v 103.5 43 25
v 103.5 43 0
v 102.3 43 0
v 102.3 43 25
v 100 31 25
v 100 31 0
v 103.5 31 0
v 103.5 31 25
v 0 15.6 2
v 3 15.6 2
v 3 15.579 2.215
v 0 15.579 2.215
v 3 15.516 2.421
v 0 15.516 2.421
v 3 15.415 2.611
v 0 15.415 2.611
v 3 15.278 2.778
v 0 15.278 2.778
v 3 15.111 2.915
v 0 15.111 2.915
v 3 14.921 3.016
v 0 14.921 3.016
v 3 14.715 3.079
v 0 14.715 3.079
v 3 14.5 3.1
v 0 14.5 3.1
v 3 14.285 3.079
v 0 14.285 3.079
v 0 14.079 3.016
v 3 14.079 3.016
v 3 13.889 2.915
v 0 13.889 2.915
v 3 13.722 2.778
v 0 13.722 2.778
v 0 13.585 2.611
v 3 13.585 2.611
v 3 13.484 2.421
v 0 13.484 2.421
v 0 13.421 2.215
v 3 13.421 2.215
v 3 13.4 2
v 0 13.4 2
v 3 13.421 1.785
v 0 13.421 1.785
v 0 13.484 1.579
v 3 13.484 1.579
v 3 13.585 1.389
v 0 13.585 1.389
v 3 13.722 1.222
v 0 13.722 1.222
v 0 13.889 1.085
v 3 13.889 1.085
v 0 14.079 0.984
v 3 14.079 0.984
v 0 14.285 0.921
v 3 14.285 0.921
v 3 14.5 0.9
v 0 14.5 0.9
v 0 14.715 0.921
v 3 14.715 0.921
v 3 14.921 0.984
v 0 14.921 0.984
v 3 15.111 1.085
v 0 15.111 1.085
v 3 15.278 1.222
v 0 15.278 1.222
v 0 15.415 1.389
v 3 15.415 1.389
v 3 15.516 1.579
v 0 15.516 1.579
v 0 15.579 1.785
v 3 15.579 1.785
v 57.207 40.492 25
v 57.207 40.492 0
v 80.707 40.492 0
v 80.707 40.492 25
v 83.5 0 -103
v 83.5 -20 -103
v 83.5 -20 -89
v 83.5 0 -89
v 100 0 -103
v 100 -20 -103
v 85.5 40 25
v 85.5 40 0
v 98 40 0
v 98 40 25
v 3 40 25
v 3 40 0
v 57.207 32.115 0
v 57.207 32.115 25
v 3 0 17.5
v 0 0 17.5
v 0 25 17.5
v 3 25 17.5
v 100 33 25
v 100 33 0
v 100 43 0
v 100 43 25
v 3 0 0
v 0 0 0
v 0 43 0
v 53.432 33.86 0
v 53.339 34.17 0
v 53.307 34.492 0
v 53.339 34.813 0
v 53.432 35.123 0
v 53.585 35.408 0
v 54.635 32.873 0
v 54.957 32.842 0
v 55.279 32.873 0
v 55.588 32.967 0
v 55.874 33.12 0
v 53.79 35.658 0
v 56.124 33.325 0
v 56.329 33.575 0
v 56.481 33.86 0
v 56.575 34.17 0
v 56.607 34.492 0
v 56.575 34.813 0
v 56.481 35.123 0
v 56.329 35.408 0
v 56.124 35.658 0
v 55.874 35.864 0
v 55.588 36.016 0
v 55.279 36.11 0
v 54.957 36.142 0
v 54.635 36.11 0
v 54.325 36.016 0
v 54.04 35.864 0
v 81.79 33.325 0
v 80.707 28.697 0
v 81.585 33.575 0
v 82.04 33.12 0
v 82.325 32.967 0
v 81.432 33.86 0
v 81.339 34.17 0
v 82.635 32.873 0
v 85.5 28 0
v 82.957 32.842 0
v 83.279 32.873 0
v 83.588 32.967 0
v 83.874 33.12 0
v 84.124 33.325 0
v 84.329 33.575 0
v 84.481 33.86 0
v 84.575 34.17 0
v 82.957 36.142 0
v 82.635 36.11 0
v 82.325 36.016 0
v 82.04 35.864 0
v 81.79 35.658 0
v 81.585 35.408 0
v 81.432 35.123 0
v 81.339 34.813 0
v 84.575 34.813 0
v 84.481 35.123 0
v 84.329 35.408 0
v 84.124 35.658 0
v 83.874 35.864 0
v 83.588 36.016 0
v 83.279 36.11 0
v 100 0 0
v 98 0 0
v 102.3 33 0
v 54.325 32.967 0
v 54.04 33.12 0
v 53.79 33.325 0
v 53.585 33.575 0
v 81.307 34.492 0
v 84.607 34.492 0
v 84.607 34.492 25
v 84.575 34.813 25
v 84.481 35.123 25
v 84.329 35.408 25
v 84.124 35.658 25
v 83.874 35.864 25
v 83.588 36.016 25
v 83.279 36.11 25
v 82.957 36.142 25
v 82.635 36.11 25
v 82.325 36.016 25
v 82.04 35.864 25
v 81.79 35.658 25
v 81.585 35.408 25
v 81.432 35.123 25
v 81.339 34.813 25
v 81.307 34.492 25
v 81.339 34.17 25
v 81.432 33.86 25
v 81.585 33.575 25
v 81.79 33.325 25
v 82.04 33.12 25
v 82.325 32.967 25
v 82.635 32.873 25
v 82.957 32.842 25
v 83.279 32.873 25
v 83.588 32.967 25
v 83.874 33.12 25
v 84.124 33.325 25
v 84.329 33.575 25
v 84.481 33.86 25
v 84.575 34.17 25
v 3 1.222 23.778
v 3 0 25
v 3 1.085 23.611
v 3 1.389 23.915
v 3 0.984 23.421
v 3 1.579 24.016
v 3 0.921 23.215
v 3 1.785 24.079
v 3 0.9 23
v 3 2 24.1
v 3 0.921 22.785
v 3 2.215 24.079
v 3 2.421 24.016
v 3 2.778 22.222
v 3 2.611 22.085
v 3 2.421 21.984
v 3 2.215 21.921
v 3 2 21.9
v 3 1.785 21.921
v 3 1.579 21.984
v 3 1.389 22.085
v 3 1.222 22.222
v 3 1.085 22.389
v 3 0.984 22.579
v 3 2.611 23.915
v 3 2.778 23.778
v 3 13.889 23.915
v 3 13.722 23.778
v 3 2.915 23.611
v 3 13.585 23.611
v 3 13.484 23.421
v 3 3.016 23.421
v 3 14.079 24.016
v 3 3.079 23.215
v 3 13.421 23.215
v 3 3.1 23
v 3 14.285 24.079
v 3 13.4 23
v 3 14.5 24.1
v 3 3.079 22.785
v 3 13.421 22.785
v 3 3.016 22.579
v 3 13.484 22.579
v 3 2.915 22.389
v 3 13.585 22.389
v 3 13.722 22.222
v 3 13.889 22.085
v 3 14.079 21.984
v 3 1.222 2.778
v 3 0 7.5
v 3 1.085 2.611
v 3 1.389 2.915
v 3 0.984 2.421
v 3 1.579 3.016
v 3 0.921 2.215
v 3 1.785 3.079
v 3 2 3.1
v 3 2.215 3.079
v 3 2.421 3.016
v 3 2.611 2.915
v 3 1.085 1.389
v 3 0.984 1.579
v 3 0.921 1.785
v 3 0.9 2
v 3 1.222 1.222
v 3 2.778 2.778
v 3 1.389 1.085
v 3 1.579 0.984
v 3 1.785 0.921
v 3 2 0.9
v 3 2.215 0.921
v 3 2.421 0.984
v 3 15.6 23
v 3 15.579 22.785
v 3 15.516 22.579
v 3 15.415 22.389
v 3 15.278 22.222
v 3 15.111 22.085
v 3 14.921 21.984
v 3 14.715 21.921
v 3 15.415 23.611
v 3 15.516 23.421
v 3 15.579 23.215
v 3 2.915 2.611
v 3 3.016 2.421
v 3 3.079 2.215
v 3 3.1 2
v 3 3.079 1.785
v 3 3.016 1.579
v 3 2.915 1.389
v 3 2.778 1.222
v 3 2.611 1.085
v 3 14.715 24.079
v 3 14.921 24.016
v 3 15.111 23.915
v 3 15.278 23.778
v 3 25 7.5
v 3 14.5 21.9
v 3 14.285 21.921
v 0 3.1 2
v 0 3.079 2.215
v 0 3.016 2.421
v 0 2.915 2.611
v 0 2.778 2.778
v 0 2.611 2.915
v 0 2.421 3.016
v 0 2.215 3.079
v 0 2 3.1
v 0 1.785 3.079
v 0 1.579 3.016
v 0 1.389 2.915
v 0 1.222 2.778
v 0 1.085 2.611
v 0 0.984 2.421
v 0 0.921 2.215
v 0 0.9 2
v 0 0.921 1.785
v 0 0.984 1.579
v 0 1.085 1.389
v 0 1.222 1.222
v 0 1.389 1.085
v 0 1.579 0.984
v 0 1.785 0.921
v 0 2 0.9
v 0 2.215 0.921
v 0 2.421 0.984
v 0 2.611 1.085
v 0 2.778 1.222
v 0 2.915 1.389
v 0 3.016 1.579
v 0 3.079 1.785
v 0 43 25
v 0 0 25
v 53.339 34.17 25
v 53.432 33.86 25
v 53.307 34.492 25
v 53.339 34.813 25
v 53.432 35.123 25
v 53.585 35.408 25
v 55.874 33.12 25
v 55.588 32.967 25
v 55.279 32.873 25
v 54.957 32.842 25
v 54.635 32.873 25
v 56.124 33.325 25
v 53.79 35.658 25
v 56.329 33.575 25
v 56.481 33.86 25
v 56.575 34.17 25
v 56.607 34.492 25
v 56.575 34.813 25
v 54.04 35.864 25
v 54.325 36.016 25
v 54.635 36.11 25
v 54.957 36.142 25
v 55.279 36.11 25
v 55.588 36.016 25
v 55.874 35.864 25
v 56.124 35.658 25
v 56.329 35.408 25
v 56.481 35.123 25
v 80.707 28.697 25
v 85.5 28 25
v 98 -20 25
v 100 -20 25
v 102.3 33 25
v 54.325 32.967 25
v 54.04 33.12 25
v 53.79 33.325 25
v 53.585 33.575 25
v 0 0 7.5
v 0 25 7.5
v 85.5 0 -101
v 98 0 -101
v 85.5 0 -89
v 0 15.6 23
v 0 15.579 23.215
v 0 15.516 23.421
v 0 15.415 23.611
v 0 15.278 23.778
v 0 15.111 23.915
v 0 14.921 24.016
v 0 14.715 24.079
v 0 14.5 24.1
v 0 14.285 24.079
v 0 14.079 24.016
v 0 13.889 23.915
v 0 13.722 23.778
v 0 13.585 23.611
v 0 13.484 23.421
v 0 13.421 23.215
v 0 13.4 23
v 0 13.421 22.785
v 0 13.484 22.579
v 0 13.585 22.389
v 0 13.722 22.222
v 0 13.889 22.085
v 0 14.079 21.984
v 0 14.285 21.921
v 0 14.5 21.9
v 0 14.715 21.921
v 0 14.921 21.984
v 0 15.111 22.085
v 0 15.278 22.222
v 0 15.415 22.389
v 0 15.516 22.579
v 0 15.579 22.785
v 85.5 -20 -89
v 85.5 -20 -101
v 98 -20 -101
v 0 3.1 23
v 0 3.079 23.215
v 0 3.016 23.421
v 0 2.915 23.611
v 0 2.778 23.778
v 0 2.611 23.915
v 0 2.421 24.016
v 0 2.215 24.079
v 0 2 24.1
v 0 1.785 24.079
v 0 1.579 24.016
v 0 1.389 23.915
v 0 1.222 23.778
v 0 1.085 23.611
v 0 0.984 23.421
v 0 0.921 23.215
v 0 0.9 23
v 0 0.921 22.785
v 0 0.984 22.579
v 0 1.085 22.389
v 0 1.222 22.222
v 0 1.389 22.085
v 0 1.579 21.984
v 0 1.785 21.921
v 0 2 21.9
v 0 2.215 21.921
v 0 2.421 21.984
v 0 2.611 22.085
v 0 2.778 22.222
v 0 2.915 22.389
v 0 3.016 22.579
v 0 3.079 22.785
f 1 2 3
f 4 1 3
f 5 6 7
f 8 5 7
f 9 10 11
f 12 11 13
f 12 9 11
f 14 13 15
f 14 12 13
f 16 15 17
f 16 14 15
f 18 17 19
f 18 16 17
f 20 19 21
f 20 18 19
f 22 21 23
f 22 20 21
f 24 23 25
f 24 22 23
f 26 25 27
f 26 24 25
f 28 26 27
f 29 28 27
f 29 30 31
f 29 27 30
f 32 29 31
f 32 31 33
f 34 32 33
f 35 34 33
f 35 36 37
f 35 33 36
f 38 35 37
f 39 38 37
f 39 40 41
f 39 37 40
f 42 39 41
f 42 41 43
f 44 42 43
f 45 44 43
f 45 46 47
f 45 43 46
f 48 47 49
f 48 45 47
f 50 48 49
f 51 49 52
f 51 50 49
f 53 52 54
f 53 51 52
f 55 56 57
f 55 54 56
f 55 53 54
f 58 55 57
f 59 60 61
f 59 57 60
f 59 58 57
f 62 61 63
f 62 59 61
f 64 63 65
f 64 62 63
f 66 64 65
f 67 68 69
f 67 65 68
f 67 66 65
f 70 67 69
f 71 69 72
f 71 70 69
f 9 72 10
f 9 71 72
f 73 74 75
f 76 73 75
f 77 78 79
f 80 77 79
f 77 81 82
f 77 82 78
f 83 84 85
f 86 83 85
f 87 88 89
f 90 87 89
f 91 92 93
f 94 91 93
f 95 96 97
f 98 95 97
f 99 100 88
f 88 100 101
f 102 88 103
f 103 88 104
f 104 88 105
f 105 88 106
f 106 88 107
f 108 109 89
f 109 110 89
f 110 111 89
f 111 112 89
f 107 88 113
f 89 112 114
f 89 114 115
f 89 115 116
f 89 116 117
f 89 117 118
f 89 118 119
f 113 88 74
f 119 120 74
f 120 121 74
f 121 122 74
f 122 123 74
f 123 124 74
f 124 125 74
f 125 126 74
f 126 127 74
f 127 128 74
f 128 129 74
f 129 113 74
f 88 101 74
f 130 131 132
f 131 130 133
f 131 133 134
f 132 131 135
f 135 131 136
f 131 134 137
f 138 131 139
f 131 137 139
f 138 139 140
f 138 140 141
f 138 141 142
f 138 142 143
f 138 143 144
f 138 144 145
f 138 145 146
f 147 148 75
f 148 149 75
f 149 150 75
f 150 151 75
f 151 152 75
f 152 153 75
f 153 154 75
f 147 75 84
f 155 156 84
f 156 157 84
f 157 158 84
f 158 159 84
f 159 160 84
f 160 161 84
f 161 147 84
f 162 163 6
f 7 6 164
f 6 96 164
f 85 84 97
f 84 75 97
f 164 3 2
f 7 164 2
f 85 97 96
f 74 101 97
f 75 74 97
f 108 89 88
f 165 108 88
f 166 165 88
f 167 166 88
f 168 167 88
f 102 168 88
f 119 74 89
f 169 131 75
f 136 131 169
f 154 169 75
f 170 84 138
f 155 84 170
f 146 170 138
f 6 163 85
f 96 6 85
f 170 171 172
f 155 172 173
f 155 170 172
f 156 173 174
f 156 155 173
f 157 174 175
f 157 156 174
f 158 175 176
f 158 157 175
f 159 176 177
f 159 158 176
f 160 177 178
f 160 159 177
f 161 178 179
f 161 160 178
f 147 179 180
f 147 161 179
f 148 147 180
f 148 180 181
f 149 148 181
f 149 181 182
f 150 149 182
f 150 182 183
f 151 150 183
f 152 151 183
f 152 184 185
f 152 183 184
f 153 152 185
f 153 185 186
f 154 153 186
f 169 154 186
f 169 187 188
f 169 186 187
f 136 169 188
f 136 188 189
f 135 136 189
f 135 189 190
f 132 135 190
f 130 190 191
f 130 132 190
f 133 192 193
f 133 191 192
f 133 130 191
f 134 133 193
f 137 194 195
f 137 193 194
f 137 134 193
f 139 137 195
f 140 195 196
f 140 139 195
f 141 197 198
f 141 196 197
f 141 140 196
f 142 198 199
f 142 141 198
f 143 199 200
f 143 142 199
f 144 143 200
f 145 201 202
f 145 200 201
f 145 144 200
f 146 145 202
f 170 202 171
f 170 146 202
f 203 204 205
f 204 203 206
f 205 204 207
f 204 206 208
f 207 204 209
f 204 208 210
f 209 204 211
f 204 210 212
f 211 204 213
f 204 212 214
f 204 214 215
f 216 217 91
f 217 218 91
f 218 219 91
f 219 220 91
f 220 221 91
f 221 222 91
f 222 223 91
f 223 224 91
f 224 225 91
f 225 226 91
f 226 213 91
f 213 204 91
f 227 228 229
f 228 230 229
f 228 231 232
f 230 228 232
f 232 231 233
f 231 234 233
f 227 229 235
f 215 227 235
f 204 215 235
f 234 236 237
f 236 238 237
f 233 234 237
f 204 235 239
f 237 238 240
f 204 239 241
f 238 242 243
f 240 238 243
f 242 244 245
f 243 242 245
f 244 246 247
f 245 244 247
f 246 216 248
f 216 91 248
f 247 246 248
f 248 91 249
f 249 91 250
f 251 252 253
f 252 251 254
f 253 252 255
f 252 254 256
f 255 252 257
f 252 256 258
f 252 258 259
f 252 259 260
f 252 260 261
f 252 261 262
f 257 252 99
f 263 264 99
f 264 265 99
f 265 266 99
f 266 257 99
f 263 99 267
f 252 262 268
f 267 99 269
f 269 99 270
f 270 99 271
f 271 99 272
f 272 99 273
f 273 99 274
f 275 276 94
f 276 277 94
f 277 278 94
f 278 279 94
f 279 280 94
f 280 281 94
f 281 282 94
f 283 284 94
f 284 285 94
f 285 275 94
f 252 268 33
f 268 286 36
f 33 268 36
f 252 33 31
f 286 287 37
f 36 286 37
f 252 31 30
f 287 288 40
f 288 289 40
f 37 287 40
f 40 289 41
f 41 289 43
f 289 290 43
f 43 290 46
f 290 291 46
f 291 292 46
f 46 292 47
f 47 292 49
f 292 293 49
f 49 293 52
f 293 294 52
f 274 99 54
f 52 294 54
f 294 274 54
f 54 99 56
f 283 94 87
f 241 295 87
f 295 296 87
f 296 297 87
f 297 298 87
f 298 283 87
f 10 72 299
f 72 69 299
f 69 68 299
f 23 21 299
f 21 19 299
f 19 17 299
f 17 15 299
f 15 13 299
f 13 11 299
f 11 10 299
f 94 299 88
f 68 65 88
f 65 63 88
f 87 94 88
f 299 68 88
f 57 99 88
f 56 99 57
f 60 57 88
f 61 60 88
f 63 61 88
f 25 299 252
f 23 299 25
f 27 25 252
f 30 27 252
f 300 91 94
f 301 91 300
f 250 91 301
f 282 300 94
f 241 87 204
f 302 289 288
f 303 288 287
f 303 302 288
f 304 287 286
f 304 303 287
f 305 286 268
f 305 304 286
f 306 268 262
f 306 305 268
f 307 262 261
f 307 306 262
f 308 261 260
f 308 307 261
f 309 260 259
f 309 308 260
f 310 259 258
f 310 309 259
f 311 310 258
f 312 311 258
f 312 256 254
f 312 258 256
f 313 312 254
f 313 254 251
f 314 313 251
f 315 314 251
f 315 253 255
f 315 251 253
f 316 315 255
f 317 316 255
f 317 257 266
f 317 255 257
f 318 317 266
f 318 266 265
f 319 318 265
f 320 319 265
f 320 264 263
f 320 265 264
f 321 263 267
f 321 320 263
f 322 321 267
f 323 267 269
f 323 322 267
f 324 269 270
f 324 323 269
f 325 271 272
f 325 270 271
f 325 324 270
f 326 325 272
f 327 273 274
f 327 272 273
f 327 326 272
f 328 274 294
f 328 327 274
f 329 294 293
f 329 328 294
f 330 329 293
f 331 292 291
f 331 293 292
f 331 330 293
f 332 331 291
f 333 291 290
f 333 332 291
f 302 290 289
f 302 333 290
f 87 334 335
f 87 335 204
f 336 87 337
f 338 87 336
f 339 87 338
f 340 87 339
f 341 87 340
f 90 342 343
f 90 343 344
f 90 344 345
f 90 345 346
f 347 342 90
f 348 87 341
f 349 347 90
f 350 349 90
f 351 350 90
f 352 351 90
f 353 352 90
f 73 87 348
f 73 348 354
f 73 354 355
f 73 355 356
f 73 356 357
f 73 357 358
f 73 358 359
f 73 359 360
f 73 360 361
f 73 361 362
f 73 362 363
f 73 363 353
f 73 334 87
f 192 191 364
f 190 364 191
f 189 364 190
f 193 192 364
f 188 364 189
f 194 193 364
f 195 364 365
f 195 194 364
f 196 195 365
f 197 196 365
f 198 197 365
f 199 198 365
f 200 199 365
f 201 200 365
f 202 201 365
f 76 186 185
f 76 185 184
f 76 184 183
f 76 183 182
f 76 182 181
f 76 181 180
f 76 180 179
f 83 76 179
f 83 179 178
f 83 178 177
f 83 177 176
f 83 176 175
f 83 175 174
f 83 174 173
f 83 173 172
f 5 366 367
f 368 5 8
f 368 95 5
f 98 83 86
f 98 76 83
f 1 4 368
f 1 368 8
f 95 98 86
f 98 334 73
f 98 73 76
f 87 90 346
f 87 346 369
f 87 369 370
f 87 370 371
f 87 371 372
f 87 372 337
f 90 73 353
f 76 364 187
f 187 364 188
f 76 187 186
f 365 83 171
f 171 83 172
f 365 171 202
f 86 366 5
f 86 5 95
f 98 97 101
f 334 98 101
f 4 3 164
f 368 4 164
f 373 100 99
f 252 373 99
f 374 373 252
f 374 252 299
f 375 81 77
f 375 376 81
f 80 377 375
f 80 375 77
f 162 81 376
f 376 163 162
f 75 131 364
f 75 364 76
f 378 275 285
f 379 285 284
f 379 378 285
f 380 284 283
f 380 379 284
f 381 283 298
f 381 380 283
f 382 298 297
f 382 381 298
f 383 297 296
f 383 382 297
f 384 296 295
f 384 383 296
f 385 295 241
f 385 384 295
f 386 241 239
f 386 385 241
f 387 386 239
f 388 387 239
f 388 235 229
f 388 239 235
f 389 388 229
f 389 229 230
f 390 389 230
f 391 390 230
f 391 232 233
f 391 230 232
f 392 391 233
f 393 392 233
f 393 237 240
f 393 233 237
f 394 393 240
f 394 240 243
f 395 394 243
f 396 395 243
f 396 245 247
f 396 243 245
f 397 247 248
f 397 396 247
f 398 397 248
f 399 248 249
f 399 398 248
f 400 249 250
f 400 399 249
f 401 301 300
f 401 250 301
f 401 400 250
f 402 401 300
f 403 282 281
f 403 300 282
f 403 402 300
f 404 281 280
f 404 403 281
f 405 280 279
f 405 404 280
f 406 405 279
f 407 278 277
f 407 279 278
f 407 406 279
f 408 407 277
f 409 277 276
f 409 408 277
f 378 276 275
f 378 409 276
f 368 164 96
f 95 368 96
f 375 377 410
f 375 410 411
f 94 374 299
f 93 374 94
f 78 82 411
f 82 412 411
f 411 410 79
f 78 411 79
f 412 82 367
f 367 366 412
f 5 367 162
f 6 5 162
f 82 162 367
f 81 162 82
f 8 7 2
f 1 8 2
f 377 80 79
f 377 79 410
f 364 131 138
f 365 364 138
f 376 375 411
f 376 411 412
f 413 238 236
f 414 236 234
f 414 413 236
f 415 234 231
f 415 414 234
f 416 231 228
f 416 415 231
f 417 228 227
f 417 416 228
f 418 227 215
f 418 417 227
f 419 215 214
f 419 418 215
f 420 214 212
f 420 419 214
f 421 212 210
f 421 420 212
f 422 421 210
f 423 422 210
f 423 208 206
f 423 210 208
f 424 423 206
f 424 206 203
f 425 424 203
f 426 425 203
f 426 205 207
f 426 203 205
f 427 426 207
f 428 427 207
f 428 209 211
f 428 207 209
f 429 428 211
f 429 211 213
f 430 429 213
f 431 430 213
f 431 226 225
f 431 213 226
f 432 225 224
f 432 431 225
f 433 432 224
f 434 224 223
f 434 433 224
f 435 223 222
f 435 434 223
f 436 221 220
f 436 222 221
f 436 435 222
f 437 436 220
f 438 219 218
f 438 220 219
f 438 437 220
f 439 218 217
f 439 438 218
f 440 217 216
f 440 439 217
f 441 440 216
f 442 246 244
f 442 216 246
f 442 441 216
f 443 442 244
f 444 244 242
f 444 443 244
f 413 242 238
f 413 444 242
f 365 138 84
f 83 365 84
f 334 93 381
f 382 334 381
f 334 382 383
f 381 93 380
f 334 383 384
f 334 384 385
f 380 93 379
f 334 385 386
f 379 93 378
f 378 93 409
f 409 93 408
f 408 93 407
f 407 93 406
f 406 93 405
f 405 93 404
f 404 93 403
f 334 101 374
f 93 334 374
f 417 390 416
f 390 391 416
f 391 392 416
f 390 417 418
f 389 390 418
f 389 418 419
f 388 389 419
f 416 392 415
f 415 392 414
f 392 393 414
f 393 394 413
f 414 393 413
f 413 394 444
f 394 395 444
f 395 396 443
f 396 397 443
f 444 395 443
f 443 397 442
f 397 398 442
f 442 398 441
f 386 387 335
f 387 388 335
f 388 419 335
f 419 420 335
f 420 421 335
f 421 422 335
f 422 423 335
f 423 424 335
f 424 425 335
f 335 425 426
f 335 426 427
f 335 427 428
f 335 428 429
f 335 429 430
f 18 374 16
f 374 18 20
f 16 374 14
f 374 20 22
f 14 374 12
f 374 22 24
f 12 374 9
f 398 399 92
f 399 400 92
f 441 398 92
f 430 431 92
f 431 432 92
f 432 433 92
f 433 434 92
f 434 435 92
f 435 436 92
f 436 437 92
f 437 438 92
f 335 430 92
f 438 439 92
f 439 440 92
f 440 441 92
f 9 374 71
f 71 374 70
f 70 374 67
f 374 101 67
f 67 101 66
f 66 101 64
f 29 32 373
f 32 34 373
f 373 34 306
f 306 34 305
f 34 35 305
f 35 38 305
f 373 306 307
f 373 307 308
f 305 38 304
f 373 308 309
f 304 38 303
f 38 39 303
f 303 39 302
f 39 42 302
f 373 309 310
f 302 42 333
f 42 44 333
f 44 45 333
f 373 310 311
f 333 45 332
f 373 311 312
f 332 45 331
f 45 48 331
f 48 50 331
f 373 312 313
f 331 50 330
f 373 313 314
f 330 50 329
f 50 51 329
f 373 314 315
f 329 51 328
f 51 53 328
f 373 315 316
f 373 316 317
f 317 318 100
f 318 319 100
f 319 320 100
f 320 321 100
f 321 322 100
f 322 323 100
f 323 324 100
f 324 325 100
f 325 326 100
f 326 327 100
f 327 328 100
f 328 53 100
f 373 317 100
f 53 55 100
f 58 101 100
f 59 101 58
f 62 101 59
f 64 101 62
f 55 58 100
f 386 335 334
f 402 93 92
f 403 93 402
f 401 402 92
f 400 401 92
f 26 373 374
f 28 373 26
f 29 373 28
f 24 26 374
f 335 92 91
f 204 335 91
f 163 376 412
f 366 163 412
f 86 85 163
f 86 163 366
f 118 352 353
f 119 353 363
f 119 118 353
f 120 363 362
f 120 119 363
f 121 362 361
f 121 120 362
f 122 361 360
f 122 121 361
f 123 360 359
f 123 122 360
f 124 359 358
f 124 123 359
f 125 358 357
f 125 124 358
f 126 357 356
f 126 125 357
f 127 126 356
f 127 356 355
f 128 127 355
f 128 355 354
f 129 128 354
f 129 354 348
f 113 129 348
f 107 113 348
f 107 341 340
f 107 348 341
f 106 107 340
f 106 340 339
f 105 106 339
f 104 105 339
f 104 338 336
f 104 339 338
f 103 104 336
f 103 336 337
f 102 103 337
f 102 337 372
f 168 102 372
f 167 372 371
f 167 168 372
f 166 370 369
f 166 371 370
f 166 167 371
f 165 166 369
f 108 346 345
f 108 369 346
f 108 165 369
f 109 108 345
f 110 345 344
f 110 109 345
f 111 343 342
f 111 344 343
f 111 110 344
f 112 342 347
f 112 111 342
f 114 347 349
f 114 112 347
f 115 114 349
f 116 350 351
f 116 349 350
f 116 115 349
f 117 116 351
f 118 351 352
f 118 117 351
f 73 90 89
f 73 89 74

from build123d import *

# Parameters (mm, degrees)
PAD002_DEPTH    = 25
SKETCH003_R     = 1.1
SKETCH003_W     = 25
SKETCH003_H     = 10
POCKET_DEPTH    = 5
PAD015_DEPTH    = 20
SKETCH029_R     = 1.65
SKETCH029_W     = 23.5
SKETCH029_H     = 12
POCKET009_DEPTH = 50


with BuildPart() as part:
    # Sketch002 → Pad002 (new body)
    with BuildSketch(Plane.XY):
        Polygon((100, 33), (100, 43), (98, 43), (0, 43), (0, 0), (3, 0), (3, 40), (85.5, 28), (85.5, 40), (98, 40), (98, -20), (100, -20), (100, 31), (103.5, 31), (103.5, 43), (102.3, 43), (102.3, 33), align=None)
    extrude(amount=PAD002_DEPTH)

    # Sketch003 → Pocket (cut)
    with BuildSketch(Plane.YZ):
        with Locations((2, 23)):
            Circle(SKETCH003_R)
        with Locations((2, 2)):
            Circle(SKETCH003_R)
        with Locations((14.5, 23)):
            Circle(SKETCH003_R)
        with Locations((14.5, 2)):
            Circle(SKETCH003_R)
        with Locations((12.5, 12.5)):
            Rectangle(SKETCH003_W, SKETCH003_H)
    extrude(amount=POCKET_DEPTH, mode=Mode.SUBTRACT)

    # Sketch018 → Pad015 (join)
    with BuildSketch(Plane.XZ):
        Polygon((100, 0), (100, -103), (83.5, -103), (83.5, -89), (85.5, -89), (85.5, -101), (98, -101), (98, 0), align=None)
    extrude(amount=PAD015_DEPTH)

    # Sketch029 → Pocket009 (cut)
    with BuildSketch(Plane.XY):
        with Locations((54.956858, 34.491576)):
            Circle(SKETCH029_R)
        with Locations((82.956858, 34.491576)):
            Circle(SKETCH029_R)
        with Locations((68.956858, 34.491576)):
            Rectangle(SKETCH029_W, SKETCH029_H)
    extrude(amount=POCKET009_DEPTH, mode=Mode.SUBTRACT)


solid = part.part
